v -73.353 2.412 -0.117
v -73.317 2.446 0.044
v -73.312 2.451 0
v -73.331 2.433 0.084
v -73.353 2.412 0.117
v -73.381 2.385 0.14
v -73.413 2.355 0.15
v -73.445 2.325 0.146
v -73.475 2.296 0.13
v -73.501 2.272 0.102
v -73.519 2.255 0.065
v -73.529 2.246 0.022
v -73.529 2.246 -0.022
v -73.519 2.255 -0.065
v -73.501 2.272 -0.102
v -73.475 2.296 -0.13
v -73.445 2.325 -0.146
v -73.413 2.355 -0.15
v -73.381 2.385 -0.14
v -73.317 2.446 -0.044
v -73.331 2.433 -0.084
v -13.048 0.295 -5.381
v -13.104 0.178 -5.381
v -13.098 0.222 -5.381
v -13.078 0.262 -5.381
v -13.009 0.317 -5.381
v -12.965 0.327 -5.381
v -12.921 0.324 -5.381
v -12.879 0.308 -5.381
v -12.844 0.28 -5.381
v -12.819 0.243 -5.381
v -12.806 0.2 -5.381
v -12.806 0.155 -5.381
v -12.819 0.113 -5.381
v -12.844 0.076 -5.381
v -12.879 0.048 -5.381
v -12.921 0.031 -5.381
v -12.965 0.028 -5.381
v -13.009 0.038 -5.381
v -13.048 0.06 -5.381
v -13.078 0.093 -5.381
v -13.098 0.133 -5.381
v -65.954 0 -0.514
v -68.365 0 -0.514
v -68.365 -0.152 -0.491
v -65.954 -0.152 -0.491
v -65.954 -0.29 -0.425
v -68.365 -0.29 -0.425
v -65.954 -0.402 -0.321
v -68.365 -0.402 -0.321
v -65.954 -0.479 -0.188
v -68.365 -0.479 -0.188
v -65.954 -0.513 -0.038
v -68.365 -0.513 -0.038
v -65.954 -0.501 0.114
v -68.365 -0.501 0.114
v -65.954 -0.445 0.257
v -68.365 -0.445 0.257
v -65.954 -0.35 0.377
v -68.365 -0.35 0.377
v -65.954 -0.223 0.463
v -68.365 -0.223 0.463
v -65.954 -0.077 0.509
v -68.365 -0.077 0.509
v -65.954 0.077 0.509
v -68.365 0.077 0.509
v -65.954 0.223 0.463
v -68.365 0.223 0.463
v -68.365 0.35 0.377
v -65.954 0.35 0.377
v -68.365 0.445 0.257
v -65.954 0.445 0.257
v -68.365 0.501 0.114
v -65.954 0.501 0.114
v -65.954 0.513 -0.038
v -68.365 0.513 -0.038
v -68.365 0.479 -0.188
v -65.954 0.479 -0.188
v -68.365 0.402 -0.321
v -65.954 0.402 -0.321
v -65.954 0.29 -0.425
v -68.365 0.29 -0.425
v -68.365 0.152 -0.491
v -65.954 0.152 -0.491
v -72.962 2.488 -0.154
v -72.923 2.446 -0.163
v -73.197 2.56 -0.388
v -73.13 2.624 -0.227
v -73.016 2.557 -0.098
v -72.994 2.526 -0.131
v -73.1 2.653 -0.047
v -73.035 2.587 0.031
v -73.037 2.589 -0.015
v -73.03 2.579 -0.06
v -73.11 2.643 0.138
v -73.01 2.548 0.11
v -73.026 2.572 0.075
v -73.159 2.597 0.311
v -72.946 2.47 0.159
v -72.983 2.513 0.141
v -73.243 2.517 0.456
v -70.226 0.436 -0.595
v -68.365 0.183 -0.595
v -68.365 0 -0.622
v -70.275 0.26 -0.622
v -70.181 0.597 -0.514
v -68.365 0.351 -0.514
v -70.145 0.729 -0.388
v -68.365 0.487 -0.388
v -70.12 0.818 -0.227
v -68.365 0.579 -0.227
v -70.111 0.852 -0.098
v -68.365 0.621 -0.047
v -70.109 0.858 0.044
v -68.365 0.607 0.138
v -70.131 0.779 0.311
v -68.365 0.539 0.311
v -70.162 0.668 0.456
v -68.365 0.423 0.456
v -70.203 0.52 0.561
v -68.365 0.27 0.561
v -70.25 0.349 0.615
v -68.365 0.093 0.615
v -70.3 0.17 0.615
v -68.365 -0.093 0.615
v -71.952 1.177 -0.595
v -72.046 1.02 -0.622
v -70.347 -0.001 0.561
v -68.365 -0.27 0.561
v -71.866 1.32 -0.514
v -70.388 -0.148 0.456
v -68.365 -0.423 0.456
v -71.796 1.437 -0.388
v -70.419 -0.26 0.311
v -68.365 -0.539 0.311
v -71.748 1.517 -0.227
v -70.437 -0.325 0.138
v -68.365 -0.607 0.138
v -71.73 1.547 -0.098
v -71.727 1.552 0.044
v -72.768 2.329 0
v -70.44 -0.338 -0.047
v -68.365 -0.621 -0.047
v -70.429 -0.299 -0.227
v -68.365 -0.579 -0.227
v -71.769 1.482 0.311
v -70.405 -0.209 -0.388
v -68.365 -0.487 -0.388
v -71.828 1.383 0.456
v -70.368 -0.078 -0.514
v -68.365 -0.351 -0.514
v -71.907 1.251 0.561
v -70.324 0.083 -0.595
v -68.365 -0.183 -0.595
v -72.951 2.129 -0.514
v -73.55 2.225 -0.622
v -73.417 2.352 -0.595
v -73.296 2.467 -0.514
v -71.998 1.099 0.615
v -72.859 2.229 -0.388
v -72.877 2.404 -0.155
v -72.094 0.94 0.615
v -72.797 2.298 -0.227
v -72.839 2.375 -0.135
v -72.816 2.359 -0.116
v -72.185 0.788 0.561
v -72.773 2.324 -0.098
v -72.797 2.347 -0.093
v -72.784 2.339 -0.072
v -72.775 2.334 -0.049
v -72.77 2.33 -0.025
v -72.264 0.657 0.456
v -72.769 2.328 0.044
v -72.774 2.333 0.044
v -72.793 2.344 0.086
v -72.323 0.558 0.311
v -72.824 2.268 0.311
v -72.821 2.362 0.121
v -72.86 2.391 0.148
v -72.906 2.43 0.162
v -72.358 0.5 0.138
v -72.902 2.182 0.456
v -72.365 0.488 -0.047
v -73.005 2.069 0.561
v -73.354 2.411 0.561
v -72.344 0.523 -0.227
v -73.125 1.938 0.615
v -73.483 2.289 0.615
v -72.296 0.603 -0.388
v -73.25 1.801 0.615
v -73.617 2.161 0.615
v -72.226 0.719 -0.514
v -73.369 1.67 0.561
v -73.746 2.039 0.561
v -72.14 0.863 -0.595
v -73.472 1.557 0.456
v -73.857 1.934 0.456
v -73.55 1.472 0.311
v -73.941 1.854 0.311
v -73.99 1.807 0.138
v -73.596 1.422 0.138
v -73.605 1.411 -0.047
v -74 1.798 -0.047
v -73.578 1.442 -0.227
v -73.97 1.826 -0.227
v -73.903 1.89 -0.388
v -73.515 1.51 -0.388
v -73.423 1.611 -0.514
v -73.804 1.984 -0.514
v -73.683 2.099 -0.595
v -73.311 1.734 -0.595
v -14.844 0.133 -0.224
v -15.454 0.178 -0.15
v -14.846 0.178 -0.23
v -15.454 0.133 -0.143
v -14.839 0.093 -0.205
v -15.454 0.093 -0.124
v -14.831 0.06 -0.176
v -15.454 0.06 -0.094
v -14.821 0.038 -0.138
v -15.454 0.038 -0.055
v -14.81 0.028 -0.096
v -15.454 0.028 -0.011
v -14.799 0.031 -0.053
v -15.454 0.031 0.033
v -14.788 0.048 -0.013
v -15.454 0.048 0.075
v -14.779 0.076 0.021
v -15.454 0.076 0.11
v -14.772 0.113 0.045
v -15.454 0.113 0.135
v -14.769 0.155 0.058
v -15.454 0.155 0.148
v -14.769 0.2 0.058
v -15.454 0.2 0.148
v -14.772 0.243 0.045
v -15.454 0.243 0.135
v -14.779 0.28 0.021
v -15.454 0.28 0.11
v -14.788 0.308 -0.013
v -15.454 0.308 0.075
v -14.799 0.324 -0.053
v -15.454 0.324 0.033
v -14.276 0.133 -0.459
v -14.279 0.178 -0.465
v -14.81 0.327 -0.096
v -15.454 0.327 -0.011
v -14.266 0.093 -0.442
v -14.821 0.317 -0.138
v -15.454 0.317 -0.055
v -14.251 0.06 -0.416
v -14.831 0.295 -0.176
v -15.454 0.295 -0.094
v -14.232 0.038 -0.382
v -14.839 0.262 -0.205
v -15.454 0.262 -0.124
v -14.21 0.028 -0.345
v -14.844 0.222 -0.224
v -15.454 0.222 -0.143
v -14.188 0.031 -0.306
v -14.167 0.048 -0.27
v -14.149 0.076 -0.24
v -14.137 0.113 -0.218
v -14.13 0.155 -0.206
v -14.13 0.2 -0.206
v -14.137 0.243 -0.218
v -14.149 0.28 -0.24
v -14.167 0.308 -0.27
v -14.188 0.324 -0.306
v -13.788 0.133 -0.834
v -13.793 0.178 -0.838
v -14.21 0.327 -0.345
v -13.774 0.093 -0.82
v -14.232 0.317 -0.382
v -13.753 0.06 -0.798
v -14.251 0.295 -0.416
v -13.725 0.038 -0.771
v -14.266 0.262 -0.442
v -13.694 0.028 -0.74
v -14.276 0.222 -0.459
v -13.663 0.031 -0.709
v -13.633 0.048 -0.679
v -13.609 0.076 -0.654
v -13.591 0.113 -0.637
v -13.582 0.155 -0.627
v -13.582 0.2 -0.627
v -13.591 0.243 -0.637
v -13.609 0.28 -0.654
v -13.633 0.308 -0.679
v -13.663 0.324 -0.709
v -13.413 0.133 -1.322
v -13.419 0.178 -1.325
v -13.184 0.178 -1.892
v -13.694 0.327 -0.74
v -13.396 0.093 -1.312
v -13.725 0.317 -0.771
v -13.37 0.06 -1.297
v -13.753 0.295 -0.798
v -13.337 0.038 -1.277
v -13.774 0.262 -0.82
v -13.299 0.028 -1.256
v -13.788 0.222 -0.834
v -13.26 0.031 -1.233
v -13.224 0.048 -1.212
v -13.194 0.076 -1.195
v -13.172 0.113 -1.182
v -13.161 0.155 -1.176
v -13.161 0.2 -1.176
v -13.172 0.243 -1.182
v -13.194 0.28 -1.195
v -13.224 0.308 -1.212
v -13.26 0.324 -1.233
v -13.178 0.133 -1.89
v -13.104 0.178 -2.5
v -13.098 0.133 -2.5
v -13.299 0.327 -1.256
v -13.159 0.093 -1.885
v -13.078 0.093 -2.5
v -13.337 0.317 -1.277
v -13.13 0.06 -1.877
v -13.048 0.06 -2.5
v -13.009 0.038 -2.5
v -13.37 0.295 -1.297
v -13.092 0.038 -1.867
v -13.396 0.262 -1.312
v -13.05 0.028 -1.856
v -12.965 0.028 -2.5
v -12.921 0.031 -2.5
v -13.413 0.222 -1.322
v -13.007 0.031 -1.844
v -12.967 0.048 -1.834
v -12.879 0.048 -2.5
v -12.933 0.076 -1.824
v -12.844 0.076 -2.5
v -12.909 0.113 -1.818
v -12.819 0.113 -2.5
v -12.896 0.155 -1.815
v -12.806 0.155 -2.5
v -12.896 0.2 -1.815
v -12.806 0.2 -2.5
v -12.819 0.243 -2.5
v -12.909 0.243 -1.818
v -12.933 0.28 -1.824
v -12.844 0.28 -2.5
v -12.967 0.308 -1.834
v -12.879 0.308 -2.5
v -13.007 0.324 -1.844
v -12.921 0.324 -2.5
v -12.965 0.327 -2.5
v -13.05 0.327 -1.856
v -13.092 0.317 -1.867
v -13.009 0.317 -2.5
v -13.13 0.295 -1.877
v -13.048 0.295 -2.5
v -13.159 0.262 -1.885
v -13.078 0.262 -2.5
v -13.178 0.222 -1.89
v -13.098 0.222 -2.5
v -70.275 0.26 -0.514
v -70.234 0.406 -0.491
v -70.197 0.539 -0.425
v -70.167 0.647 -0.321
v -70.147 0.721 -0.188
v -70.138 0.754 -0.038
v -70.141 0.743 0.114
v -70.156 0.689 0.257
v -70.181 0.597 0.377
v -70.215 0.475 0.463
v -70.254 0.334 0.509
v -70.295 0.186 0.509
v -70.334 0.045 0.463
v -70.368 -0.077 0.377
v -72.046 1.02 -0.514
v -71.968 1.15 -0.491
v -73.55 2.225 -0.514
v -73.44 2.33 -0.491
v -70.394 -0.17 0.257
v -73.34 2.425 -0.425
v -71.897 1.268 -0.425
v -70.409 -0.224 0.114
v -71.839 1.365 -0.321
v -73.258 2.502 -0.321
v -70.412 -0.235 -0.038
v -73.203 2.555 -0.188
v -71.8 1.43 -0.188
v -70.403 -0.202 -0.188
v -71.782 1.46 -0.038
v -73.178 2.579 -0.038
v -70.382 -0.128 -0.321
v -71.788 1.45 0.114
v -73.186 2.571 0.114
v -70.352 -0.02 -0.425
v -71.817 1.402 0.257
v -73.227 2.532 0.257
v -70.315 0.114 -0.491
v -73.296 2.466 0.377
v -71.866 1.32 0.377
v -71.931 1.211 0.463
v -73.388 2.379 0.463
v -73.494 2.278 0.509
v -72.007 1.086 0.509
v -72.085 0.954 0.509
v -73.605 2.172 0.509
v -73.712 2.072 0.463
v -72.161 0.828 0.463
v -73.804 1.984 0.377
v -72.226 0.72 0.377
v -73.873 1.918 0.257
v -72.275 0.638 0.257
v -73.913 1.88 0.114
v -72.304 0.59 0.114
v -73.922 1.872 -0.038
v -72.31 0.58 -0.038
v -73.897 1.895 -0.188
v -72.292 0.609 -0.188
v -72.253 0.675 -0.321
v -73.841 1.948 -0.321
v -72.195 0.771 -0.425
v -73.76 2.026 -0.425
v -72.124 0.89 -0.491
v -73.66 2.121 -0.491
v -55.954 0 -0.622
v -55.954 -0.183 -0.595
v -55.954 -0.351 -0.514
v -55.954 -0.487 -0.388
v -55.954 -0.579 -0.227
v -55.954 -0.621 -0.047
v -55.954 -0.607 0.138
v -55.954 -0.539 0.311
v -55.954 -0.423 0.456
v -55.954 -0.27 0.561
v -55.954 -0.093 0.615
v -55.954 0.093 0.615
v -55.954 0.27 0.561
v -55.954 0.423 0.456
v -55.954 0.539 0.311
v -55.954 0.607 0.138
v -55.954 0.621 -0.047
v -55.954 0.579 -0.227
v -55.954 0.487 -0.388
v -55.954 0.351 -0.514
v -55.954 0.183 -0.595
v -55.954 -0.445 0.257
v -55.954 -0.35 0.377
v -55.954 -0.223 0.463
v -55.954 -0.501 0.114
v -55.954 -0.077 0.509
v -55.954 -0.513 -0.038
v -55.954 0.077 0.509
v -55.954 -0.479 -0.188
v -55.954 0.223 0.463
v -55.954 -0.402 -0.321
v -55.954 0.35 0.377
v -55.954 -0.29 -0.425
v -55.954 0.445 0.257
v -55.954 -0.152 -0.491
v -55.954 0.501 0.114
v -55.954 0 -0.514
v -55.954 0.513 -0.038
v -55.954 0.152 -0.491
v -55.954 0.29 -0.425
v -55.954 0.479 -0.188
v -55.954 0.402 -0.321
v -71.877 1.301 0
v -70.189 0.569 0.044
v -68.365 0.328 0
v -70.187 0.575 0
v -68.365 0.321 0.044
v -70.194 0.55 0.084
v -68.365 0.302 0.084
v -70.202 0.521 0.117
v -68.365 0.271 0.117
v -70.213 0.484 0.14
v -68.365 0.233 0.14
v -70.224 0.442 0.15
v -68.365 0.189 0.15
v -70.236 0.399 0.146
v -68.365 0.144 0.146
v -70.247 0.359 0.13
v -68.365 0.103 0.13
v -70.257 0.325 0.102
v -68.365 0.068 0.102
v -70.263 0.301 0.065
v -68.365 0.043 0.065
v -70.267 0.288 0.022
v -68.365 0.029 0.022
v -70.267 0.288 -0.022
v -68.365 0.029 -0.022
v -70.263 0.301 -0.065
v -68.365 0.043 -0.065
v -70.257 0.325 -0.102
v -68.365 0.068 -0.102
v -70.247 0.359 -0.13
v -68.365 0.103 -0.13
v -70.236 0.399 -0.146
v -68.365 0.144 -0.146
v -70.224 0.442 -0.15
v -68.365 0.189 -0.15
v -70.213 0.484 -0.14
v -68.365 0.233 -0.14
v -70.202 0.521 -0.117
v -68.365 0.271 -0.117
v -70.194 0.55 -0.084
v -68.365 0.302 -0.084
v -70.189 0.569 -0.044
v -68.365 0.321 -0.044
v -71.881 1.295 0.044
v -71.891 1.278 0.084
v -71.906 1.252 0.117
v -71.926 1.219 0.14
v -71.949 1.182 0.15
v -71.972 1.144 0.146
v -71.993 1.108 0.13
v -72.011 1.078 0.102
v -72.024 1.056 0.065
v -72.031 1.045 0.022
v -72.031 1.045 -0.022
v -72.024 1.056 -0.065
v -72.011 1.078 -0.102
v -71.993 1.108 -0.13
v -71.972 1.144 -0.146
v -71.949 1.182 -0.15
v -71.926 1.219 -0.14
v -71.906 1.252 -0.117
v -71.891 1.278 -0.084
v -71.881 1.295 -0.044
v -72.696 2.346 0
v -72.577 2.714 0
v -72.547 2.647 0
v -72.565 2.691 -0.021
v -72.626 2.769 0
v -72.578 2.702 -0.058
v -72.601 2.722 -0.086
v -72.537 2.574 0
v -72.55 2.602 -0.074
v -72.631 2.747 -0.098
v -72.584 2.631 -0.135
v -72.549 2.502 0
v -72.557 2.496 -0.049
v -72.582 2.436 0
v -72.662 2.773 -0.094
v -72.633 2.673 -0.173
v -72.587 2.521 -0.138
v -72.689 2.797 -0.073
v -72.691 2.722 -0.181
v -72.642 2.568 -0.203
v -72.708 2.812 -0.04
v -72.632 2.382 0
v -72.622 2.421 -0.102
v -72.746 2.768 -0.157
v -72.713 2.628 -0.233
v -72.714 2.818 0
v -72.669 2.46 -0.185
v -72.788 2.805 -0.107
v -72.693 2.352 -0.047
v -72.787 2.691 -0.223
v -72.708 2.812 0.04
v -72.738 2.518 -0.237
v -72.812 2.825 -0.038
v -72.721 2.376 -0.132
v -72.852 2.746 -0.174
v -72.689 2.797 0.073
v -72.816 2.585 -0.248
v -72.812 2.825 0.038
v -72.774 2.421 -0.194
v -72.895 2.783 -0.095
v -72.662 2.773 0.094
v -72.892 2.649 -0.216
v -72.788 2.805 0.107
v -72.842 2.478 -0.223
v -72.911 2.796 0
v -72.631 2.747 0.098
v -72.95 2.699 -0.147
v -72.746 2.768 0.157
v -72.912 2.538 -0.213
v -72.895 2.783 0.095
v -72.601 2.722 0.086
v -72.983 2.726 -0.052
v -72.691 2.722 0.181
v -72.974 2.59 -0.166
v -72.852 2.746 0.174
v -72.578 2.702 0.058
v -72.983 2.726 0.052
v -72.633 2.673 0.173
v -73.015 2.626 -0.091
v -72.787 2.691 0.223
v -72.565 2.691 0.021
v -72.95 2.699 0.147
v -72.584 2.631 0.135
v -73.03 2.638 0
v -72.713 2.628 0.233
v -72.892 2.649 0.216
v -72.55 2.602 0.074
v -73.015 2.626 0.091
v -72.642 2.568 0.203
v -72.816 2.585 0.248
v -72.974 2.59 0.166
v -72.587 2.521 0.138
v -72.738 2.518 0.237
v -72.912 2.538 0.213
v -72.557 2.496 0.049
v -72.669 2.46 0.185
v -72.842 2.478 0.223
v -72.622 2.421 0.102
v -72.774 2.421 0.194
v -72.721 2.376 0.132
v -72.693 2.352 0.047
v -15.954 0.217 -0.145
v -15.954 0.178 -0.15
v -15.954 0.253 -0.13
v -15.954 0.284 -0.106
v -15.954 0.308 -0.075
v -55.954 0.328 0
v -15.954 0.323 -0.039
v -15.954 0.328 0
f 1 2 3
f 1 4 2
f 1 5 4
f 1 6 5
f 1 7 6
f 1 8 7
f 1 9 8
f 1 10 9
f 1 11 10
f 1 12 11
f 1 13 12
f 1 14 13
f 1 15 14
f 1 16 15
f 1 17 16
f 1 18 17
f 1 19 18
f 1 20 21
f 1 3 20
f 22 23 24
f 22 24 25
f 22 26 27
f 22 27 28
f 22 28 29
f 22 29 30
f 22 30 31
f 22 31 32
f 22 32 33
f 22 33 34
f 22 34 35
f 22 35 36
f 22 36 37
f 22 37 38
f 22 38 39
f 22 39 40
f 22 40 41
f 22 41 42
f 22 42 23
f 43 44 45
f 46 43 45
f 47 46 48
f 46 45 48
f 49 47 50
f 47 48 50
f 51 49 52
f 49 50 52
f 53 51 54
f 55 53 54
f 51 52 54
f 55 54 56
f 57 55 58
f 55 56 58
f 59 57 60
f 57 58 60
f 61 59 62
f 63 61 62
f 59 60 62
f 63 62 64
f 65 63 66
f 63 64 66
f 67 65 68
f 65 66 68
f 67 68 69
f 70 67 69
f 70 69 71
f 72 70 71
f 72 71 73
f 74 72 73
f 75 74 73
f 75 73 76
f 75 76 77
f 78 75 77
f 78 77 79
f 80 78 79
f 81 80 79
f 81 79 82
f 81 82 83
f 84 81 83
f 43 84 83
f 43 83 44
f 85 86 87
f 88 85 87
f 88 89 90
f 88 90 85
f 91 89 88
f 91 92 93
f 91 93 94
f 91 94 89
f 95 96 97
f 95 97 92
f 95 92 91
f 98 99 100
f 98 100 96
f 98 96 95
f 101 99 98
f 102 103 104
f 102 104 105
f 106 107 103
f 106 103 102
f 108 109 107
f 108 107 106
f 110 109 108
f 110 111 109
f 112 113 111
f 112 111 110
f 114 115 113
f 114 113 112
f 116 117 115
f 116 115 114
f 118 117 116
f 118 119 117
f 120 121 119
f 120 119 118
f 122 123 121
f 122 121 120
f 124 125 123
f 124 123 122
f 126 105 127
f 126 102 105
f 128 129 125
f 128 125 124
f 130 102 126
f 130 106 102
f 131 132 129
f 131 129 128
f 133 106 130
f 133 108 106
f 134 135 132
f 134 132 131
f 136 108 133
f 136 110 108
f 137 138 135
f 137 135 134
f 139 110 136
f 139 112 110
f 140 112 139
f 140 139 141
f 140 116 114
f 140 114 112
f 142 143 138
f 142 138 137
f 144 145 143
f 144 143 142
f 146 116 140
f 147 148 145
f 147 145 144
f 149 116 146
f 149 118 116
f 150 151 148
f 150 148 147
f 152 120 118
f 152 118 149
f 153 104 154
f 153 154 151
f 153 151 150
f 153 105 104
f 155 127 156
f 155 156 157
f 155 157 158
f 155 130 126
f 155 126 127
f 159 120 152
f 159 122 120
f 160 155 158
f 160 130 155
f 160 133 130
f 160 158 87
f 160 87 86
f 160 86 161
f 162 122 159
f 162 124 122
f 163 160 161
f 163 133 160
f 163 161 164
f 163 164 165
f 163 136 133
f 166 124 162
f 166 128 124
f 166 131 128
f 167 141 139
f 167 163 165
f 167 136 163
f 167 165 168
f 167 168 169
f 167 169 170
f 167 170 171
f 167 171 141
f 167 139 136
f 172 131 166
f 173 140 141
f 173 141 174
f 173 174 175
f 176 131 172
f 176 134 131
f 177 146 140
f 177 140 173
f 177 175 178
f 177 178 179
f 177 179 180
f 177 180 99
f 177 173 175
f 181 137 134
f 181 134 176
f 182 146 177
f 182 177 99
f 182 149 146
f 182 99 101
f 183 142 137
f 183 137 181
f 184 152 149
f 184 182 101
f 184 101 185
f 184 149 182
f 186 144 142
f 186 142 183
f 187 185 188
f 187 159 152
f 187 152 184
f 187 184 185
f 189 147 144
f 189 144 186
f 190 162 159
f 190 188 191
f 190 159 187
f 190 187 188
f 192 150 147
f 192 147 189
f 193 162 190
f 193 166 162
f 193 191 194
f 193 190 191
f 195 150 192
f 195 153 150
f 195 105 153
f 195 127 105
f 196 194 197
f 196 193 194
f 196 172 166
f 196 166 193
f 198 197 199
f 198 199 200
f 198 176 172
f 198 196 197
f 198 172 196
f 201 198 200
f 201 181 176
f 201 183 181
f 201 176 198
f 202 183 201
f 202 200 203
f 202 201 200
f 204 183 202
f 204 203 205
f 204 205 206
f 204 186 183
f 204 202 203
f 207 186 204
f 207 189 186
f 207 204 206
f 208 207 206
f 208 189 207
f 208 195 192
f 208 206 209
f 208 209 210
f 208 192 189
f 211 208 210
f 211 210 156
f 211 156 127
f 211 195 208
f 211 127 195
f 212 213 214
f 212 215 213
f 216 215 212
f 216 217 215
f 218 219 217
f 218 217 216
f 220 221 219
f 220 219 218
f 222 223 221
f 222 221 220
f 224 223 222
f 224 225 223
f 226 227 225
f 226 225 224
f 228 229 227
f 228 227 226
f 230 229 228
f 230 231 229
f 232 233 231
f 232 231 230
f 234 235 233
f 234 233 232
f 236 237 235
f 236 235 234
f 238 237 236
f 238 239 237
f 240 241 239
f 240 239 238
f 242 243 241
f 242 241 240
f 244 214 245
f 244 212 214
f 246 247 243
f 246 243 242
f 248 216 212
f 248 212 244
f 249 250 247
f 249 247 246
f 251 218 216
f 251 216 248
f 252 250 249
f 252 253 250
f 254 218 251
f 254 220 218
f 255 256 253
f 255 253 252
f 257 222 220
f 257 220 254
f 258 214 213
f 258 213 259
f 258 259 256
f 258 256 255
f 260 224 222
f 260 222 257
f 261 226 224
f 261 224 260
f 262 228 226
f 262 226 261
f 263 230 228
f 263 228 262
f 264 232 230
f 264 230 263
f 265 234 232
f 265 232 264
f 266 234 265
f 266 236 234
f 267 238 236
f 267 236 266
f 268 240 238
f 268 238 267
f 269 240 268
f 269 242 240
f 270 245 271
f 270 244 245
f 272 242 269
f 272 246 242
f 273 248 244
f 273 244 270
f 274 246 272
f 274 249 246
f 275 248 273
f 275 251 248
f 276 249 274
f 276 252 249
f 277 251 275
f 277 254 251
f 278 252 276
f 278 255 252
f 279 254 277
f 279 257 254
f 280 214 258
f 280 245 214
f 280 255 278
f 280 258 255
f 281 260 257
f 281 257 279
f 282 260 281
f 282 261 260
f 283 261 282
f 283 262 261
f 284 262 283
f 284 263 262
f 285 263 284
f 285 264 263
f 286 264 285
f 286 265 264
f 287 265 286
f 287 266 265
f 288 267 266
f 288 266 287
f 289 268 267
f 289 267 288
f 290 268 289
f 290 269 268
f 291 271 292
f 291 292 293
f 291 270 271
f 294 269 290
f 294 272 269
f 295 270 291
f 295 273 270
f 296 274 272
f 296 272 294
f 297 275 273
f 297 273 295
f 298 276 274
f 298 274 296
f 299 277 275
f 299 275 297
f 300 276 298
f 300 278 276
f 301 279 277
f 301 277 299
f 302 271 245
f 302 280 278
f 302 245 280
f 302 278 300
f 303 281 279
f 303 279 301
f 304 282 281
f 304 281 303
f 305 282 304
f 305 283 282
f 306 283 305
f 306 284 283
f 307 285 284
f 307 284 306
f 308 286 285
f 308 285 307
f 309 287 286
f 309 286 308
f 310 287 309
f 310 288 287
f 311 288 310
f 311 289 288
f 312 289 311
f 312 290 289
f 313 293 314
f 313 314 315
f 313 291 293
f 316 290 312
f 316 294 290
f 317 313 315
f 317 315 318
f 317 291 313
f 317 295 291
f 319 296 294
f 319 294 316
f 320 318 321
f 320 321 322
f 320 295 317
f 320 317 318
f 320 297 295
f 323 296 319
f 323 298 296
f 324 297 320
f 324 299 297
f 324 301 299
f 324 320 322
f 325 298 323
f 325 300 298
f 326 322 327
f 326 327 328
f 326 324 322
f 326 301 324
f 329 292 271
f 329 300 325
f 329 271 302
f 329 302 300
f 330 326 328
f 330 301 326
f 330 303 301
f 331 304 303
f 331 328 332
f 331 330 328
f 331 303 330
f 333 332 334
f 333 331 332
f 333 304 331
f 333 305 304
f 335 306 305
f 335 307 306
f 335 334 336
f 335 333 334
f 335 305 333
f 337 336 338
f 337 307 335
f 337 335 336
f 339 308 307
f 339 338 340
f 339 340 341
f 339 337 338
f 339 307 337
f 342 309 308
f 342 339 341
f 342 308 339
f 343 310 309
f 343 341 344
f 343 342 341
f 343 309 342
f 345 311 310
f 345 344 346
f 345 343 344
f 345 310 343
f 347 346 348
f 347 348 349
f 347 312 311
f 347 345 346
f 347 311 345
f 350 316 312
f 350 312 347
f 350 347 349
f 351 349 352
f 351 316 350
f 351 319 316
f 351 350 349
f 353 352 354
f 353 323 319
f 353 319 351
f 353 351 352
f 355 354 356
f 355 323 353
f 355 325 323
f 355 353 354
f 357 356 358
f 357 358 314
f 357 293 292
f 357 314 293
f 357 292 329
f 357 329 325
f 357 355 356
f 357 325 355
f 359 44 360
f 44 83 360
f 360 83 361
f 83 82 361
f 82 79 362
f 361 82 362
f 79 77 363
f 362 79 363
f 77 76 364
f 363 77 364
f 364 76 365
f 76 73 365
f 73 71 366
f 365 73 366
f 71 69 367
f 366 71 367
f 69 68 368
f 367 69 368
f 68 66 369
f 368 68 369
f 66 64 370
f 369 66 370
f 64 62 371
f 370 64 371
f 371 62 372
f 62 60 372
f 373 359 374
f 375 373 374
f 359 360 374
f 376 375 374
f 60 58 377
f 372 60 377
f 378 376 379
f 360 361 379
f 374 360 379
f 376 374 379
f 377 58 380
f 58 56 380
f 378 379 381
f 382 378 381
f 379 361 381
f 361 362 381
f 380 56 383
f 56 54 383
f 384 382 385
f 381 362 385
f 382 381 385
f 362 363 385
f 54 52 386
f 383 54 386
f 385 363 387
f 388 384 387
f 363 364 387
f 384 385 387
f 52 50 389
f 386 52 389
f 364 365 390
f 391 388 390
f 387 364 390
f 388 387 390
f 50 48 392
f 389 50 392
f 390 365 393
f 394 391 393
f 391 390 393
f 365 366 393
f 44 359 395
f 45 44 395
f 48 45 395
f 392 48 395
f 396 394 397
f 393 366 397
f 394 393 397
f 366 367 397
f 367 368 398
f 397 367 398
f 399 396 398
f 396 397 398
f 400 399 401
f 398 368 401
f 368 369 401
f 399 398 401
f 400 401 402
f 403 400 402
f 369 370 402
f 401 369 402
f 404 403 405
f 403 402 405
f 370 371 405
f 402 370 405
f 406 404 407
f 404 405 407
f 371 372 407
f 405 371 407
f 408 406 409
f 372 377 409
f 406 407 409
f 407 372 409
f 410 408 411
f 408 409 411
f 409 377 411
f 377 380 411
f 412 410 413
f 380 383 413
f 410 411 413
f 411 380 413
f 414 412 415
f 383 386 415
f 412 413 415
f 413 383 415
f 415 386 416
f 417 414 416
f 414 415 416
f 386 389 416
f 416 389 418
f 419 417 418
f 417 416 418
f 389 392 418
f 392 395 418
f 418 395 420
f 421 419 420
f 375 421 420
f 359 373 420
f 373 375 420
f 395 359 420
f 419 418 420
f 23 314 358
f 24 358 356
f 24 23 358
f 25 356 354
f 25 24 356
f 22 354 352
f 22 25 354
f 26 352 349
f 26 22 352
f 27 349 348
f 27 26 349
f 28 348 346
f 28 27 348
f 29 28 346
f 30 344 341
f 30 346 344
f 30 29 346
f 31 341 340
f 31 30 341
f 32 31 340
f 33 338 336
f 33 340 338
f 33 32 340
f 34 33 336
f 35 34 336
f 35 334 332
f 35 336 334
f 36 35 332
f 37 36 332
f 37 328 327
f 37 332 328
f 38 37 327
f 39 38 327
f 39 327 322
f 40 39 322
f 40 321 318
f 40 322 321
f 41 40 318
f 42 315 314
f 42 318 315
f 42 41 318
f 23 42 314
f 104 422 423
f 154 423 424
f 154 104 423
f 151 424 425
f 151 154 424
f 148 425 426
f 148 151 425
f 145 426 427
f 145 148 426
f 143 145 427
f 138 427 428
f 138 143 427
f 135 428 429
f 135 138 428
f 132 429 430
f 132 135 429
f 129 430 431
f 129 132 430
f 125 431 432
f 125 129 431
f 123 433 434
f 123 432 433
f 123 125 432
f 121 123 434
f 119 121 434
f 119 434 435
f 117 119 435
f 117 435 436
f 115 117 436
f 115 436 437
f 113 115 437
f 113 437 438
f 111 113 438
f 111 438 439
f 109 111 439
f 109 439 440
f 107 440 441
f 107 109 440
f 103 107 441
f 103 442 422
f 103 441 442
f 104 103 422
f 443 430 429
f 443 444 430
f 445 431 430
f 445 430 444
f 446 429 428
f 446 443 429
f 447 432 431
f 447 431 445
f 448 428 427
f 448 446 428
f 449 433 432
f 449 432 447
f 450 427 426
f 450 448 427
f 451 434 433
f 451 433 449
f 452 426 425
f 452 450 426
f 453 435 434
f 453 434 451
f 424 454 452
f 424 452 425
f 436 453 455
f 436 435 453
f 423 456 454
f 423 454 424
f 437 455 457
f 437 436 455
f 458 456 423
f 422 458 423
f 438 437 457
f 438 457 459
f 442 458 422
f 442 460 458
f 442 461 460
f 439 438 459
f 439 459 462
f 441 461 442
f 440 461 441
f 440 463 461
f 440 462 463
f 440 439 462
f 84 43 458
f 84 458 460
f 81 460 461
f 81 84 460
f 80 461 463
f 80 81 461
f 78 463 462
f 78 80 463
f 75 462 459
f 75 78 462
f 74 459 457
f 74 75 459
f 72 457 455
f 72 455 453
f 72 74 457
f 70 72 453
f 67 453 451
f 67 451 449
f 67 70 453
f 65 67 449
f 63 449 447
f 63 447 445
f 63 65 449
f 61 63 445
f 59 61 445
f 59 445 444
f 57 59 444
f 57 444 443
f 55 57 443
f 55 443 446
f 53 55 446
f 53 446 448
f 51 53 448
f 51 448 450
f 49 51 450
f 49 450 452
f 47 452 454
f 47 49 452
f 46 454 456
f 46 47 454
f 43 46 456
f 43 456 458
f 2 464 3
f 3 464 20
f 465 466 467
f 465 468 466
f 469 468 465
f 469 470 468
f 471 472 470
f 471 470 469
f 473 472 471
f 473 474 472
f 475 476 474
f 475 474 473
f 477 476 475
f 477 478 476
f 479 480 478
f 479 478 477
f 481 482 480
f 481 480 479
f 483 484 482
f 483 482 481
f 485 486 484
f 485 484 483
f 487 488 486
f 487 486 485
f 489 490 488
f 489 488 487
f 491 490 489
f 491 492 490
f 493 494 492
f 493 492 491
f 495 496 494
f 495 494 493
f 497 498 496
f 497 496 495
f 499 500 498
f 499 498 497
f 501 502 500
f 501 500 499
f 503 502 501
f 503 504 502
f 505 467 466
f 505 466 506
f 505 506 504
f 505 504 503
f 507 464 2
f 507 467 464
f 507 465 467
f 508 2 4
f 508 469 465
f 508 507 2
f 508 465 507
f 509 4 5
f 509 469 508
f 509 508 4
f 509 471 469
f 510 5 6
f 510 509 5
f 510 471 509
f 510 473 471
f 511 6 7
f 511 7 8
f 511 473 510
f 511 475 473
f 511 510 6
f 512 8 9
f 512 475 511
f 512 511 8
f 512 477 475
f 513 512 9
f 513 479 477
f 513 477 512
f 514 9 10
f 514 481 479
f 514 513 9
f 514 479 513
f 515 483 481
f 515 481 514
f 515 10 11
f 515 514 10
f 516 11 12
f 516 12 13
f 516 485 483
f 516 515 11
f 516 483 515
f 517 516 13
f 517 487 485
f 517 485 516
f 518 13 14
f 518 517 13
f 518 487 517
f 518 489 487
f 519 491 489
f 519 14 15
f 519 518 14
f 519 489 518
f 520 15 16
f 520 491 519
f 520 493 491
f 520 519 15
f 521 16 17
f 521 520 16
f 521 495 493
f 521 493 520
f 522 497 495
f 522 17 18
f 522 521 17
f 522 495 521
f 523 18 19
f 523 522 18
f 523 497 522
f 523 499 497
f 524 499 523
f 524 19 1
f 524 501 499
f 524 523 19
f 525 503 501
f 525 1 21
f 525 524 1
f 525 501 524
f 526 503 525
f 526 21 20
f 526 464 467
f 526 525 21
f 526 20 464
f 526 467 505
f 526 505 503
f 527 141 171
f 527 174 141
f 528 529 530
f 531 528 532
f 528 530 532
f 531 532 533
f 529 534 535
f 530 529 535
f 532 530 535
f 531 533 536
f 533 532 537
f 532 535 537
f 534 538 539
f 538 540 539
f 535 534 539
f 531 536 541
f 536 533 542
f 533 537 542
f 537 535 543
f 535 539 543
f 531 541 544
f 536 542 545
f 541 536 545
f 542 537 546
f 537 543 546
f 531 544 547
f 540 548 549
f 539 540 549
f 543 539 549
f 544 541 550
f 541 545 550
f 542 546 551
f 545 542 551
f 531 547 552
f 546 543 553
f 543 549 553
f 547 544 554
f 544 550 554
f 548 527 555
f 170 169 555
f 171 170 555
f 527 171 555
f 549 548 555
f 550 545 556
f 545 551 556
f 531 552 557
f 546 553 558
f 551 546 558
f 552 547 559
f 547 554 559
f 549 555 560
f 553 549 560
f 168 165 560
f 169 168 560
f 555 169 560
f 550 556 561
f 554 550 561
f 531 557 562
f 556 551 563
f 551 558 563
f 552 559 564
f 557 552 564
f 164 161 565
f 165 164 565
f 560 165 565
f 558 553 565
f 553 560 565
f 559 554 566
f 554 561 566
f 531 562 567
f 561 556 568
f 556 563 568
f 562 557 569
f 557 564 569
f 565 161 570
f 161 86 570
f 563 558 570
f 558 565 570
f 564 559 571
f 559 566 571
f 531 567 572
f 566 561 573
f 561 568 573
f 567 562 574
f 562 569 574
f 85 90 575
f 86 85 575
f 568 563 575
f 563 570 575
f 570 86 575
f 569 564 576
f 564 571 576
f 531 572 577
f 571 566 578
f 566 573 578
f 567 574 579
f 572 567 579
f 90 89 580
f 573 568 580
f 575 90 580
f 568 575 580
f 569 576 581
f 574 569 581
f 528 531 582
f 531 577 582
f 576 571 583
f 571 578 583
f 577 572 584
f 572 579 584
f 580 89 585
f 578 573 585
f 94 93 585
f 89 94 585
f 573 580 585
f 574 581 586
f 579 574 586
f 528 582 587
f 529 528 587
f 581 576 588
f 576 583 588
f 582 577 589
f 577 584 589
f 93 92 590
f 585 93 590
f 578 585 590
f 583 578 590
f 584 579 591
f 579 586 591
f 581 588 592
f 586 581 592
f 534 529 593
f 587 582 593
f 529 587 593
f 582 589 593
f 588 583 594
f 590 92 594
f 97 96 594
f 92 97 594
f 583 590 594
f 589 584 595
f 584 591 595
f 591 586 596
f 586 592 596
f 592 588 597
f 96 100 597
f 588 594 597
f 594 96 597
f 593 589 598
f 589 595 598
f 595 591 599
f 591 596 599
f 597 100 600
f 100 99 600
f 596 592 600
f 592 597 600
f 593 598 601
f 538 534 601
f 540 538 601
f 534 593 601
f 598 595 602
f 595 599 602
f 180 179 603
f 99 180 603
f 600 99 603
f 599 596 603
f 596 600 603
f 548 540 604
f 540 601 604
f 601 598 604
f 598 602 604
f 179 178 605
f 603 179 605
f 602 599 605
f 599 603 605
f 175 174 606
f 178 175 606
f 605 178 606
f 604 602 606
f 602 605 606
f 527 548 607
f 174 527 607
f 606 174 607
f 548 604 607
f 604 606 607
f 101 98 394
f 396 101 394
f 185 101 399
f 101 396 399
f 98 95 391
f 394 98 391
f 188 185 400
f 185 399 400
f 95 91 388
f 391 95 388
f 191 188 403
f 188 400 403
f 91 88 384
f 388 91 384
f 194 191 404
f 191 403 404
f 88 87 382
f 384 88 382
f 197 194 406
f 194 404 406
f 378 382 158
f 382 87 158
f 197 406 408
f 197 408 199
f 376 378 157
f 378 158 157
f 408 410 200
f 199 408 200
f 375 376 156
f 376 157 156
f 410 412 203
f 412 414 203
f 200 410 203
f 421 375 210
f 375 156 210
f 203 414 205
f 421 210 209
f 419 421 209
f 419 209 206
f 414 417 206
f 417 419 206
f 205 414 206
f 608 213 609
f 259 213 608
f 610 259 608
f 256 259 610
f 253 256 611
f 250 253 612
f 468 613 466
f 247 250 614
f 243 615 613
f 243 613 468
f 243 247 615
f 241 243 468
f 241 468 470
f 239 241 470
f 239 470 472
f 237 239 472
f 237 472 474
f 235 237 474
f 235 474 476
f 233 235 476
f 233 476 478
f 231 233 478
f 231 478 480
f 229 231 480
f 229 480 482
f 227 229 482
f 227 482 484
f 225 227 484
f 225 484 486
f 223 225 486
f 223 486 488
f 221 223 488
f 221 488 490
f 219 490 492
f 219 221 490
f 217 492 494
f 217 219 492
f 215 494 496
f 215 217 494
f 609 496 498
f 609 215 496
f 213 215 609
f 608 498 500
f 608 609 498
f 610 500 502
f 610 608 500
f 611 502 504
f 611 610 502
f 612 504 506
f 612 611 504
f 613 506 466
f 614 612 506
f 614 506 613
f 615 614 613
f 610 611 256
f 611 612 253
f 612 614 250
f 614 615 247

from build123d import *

# Parameters (mm, degrees)
SKETCH5_R           = 0.6223
SKETCH5_R_2         = 0.51435
SKETCH5_2_R         = 0.6223
SKETCH5_2_R_2       = 0.51435
BOSS_EXTRUDE2_DEPTH = 10
SKETCH8_R           = 0.15
SKETCH9_R           = 0.15
BOSS_EXTRUDE3_DEPTH = 40
SKETCH11_R          = 0.15


with BuildPart() as part:
    # Sweep2: sweep along a path in Sketch4
    with BuildLine(Plane.XY) as sweep2_path:
        Line((-65.954222951, 0), (-68.364968213, 0))
        ThreePointArc((-68.364968213, 0), (-71.186123393, 0.579815367), (-73.549932813, 2.225265895))
    # Sketch5 → Sweep2 (sweep)
    with BuildSketch(Plane(origin=(-65.954222951, 0, 0), x_dir=(0, 0, -1), z_dir=(1, 0, 0))):
        Circle(SKETCH5_R)
        Circle(SKETCH5_R_2, mode=Mode.SUBTRACT)
    sweep(path=sweep2_path.line)

    # Sketch5<2> → Boss-Extrude2 (add)
    with BuildSketch(Plane(origin=(-65.954222951, 0, 0), x_dir=(0, 0, -1), z_dir=(1, 0, 0))):
        Circle(SKETCH5_2_R)
        Circle(SKETCH5_2_R_2, mode=Mode.SUBTRACT)
    extrude(amount=BOSS_EXTRUDE2_DEPTH)

    # Sketch6 → Revolve2 (revolve)
    with BuildSketch(Plane.XY):
        with BuildLine():
            Line((-72.949063517, 2.38792888), (-72.625665662, 2.76926053))
            ThreePointArc((-72.625665662, 2.76926053), (-72.596698765, 2.416895777), (-72.949063517, 2.38792888))
        make_face()
    revolve(axis=Axis((-72.949063517, 2.38792888, 0), (0.6467957105420484, 0.7626632997754689, 0)))


with BuildPart() as body_2:
    # Sweep3: sweep along a path in Sketch7
    with BuildLine(Plane.XY) as sweep3_path:
        Line((-55.954222951, 0.1777), (-68.364968213, 0.1777))
        ThreePointArc((-68.364968213, 0.1777), (-71.116040444, 0.743111633), (-73.421128268, 2.347685988))
    # Sketch8 → Sweep3 (sweep)
    with BuildSketch(Plane(origin=(-36.018221468, 37.89664365, 0), x_dir=(0.7248426853938525, 0.688914422429251, 0), z_dir=(-0.688914422429251, 0.7248426853938525, 0))):
        with Locations((-51.601413042, 0)):
            Circle(SKETCH8_R)
    sweep(path=sweep3_path.line)

    # Sketch9 → Boss-Extrude3 (add)
    with BuildSketch(Plane(origin=(-55.954222951, 0, 0), x_dir=(0, 0, -1), z_dir=(1, 0, 0))):
        with Locations((0, 0.1777)):
            Circle(SKETCH9_R)
    extrude(amount=BOSS_EXTRUDE3_DEPTH)

    # Sweep4: sweep along a path in Sketch10
    with BuildLine(Plane(origin=(-32.524934282, 0.1777, -2.743586274), x_dir=(1, 0, 0), z_dir=(0, -1, 0))) as sweep4_path:
        Line((16.570711331, 2.743586274), (17.070711331, 2.743586274))
        ThreePointArc((17.070711331, 2.743586274), (18.838478284, 2.011353227), (19.570711331, 0.243586274))
        Line((19.570711331, 0.243586274), (19.570711331, -2.637865197))
    # Sketch11 → Sweep4 (sweep)
    with BuildSketch(Plane(origin=(-15.954222951, 0, 0), x_dir=(0, 0, -1), z_dir=(1, 0, 0))):
        with Locations((0, 0.1777)):
            Circle(SKETCH11_R)
    sweep(path=sweep4_path.line)


solid = Compound([part.part, body_2.part])
